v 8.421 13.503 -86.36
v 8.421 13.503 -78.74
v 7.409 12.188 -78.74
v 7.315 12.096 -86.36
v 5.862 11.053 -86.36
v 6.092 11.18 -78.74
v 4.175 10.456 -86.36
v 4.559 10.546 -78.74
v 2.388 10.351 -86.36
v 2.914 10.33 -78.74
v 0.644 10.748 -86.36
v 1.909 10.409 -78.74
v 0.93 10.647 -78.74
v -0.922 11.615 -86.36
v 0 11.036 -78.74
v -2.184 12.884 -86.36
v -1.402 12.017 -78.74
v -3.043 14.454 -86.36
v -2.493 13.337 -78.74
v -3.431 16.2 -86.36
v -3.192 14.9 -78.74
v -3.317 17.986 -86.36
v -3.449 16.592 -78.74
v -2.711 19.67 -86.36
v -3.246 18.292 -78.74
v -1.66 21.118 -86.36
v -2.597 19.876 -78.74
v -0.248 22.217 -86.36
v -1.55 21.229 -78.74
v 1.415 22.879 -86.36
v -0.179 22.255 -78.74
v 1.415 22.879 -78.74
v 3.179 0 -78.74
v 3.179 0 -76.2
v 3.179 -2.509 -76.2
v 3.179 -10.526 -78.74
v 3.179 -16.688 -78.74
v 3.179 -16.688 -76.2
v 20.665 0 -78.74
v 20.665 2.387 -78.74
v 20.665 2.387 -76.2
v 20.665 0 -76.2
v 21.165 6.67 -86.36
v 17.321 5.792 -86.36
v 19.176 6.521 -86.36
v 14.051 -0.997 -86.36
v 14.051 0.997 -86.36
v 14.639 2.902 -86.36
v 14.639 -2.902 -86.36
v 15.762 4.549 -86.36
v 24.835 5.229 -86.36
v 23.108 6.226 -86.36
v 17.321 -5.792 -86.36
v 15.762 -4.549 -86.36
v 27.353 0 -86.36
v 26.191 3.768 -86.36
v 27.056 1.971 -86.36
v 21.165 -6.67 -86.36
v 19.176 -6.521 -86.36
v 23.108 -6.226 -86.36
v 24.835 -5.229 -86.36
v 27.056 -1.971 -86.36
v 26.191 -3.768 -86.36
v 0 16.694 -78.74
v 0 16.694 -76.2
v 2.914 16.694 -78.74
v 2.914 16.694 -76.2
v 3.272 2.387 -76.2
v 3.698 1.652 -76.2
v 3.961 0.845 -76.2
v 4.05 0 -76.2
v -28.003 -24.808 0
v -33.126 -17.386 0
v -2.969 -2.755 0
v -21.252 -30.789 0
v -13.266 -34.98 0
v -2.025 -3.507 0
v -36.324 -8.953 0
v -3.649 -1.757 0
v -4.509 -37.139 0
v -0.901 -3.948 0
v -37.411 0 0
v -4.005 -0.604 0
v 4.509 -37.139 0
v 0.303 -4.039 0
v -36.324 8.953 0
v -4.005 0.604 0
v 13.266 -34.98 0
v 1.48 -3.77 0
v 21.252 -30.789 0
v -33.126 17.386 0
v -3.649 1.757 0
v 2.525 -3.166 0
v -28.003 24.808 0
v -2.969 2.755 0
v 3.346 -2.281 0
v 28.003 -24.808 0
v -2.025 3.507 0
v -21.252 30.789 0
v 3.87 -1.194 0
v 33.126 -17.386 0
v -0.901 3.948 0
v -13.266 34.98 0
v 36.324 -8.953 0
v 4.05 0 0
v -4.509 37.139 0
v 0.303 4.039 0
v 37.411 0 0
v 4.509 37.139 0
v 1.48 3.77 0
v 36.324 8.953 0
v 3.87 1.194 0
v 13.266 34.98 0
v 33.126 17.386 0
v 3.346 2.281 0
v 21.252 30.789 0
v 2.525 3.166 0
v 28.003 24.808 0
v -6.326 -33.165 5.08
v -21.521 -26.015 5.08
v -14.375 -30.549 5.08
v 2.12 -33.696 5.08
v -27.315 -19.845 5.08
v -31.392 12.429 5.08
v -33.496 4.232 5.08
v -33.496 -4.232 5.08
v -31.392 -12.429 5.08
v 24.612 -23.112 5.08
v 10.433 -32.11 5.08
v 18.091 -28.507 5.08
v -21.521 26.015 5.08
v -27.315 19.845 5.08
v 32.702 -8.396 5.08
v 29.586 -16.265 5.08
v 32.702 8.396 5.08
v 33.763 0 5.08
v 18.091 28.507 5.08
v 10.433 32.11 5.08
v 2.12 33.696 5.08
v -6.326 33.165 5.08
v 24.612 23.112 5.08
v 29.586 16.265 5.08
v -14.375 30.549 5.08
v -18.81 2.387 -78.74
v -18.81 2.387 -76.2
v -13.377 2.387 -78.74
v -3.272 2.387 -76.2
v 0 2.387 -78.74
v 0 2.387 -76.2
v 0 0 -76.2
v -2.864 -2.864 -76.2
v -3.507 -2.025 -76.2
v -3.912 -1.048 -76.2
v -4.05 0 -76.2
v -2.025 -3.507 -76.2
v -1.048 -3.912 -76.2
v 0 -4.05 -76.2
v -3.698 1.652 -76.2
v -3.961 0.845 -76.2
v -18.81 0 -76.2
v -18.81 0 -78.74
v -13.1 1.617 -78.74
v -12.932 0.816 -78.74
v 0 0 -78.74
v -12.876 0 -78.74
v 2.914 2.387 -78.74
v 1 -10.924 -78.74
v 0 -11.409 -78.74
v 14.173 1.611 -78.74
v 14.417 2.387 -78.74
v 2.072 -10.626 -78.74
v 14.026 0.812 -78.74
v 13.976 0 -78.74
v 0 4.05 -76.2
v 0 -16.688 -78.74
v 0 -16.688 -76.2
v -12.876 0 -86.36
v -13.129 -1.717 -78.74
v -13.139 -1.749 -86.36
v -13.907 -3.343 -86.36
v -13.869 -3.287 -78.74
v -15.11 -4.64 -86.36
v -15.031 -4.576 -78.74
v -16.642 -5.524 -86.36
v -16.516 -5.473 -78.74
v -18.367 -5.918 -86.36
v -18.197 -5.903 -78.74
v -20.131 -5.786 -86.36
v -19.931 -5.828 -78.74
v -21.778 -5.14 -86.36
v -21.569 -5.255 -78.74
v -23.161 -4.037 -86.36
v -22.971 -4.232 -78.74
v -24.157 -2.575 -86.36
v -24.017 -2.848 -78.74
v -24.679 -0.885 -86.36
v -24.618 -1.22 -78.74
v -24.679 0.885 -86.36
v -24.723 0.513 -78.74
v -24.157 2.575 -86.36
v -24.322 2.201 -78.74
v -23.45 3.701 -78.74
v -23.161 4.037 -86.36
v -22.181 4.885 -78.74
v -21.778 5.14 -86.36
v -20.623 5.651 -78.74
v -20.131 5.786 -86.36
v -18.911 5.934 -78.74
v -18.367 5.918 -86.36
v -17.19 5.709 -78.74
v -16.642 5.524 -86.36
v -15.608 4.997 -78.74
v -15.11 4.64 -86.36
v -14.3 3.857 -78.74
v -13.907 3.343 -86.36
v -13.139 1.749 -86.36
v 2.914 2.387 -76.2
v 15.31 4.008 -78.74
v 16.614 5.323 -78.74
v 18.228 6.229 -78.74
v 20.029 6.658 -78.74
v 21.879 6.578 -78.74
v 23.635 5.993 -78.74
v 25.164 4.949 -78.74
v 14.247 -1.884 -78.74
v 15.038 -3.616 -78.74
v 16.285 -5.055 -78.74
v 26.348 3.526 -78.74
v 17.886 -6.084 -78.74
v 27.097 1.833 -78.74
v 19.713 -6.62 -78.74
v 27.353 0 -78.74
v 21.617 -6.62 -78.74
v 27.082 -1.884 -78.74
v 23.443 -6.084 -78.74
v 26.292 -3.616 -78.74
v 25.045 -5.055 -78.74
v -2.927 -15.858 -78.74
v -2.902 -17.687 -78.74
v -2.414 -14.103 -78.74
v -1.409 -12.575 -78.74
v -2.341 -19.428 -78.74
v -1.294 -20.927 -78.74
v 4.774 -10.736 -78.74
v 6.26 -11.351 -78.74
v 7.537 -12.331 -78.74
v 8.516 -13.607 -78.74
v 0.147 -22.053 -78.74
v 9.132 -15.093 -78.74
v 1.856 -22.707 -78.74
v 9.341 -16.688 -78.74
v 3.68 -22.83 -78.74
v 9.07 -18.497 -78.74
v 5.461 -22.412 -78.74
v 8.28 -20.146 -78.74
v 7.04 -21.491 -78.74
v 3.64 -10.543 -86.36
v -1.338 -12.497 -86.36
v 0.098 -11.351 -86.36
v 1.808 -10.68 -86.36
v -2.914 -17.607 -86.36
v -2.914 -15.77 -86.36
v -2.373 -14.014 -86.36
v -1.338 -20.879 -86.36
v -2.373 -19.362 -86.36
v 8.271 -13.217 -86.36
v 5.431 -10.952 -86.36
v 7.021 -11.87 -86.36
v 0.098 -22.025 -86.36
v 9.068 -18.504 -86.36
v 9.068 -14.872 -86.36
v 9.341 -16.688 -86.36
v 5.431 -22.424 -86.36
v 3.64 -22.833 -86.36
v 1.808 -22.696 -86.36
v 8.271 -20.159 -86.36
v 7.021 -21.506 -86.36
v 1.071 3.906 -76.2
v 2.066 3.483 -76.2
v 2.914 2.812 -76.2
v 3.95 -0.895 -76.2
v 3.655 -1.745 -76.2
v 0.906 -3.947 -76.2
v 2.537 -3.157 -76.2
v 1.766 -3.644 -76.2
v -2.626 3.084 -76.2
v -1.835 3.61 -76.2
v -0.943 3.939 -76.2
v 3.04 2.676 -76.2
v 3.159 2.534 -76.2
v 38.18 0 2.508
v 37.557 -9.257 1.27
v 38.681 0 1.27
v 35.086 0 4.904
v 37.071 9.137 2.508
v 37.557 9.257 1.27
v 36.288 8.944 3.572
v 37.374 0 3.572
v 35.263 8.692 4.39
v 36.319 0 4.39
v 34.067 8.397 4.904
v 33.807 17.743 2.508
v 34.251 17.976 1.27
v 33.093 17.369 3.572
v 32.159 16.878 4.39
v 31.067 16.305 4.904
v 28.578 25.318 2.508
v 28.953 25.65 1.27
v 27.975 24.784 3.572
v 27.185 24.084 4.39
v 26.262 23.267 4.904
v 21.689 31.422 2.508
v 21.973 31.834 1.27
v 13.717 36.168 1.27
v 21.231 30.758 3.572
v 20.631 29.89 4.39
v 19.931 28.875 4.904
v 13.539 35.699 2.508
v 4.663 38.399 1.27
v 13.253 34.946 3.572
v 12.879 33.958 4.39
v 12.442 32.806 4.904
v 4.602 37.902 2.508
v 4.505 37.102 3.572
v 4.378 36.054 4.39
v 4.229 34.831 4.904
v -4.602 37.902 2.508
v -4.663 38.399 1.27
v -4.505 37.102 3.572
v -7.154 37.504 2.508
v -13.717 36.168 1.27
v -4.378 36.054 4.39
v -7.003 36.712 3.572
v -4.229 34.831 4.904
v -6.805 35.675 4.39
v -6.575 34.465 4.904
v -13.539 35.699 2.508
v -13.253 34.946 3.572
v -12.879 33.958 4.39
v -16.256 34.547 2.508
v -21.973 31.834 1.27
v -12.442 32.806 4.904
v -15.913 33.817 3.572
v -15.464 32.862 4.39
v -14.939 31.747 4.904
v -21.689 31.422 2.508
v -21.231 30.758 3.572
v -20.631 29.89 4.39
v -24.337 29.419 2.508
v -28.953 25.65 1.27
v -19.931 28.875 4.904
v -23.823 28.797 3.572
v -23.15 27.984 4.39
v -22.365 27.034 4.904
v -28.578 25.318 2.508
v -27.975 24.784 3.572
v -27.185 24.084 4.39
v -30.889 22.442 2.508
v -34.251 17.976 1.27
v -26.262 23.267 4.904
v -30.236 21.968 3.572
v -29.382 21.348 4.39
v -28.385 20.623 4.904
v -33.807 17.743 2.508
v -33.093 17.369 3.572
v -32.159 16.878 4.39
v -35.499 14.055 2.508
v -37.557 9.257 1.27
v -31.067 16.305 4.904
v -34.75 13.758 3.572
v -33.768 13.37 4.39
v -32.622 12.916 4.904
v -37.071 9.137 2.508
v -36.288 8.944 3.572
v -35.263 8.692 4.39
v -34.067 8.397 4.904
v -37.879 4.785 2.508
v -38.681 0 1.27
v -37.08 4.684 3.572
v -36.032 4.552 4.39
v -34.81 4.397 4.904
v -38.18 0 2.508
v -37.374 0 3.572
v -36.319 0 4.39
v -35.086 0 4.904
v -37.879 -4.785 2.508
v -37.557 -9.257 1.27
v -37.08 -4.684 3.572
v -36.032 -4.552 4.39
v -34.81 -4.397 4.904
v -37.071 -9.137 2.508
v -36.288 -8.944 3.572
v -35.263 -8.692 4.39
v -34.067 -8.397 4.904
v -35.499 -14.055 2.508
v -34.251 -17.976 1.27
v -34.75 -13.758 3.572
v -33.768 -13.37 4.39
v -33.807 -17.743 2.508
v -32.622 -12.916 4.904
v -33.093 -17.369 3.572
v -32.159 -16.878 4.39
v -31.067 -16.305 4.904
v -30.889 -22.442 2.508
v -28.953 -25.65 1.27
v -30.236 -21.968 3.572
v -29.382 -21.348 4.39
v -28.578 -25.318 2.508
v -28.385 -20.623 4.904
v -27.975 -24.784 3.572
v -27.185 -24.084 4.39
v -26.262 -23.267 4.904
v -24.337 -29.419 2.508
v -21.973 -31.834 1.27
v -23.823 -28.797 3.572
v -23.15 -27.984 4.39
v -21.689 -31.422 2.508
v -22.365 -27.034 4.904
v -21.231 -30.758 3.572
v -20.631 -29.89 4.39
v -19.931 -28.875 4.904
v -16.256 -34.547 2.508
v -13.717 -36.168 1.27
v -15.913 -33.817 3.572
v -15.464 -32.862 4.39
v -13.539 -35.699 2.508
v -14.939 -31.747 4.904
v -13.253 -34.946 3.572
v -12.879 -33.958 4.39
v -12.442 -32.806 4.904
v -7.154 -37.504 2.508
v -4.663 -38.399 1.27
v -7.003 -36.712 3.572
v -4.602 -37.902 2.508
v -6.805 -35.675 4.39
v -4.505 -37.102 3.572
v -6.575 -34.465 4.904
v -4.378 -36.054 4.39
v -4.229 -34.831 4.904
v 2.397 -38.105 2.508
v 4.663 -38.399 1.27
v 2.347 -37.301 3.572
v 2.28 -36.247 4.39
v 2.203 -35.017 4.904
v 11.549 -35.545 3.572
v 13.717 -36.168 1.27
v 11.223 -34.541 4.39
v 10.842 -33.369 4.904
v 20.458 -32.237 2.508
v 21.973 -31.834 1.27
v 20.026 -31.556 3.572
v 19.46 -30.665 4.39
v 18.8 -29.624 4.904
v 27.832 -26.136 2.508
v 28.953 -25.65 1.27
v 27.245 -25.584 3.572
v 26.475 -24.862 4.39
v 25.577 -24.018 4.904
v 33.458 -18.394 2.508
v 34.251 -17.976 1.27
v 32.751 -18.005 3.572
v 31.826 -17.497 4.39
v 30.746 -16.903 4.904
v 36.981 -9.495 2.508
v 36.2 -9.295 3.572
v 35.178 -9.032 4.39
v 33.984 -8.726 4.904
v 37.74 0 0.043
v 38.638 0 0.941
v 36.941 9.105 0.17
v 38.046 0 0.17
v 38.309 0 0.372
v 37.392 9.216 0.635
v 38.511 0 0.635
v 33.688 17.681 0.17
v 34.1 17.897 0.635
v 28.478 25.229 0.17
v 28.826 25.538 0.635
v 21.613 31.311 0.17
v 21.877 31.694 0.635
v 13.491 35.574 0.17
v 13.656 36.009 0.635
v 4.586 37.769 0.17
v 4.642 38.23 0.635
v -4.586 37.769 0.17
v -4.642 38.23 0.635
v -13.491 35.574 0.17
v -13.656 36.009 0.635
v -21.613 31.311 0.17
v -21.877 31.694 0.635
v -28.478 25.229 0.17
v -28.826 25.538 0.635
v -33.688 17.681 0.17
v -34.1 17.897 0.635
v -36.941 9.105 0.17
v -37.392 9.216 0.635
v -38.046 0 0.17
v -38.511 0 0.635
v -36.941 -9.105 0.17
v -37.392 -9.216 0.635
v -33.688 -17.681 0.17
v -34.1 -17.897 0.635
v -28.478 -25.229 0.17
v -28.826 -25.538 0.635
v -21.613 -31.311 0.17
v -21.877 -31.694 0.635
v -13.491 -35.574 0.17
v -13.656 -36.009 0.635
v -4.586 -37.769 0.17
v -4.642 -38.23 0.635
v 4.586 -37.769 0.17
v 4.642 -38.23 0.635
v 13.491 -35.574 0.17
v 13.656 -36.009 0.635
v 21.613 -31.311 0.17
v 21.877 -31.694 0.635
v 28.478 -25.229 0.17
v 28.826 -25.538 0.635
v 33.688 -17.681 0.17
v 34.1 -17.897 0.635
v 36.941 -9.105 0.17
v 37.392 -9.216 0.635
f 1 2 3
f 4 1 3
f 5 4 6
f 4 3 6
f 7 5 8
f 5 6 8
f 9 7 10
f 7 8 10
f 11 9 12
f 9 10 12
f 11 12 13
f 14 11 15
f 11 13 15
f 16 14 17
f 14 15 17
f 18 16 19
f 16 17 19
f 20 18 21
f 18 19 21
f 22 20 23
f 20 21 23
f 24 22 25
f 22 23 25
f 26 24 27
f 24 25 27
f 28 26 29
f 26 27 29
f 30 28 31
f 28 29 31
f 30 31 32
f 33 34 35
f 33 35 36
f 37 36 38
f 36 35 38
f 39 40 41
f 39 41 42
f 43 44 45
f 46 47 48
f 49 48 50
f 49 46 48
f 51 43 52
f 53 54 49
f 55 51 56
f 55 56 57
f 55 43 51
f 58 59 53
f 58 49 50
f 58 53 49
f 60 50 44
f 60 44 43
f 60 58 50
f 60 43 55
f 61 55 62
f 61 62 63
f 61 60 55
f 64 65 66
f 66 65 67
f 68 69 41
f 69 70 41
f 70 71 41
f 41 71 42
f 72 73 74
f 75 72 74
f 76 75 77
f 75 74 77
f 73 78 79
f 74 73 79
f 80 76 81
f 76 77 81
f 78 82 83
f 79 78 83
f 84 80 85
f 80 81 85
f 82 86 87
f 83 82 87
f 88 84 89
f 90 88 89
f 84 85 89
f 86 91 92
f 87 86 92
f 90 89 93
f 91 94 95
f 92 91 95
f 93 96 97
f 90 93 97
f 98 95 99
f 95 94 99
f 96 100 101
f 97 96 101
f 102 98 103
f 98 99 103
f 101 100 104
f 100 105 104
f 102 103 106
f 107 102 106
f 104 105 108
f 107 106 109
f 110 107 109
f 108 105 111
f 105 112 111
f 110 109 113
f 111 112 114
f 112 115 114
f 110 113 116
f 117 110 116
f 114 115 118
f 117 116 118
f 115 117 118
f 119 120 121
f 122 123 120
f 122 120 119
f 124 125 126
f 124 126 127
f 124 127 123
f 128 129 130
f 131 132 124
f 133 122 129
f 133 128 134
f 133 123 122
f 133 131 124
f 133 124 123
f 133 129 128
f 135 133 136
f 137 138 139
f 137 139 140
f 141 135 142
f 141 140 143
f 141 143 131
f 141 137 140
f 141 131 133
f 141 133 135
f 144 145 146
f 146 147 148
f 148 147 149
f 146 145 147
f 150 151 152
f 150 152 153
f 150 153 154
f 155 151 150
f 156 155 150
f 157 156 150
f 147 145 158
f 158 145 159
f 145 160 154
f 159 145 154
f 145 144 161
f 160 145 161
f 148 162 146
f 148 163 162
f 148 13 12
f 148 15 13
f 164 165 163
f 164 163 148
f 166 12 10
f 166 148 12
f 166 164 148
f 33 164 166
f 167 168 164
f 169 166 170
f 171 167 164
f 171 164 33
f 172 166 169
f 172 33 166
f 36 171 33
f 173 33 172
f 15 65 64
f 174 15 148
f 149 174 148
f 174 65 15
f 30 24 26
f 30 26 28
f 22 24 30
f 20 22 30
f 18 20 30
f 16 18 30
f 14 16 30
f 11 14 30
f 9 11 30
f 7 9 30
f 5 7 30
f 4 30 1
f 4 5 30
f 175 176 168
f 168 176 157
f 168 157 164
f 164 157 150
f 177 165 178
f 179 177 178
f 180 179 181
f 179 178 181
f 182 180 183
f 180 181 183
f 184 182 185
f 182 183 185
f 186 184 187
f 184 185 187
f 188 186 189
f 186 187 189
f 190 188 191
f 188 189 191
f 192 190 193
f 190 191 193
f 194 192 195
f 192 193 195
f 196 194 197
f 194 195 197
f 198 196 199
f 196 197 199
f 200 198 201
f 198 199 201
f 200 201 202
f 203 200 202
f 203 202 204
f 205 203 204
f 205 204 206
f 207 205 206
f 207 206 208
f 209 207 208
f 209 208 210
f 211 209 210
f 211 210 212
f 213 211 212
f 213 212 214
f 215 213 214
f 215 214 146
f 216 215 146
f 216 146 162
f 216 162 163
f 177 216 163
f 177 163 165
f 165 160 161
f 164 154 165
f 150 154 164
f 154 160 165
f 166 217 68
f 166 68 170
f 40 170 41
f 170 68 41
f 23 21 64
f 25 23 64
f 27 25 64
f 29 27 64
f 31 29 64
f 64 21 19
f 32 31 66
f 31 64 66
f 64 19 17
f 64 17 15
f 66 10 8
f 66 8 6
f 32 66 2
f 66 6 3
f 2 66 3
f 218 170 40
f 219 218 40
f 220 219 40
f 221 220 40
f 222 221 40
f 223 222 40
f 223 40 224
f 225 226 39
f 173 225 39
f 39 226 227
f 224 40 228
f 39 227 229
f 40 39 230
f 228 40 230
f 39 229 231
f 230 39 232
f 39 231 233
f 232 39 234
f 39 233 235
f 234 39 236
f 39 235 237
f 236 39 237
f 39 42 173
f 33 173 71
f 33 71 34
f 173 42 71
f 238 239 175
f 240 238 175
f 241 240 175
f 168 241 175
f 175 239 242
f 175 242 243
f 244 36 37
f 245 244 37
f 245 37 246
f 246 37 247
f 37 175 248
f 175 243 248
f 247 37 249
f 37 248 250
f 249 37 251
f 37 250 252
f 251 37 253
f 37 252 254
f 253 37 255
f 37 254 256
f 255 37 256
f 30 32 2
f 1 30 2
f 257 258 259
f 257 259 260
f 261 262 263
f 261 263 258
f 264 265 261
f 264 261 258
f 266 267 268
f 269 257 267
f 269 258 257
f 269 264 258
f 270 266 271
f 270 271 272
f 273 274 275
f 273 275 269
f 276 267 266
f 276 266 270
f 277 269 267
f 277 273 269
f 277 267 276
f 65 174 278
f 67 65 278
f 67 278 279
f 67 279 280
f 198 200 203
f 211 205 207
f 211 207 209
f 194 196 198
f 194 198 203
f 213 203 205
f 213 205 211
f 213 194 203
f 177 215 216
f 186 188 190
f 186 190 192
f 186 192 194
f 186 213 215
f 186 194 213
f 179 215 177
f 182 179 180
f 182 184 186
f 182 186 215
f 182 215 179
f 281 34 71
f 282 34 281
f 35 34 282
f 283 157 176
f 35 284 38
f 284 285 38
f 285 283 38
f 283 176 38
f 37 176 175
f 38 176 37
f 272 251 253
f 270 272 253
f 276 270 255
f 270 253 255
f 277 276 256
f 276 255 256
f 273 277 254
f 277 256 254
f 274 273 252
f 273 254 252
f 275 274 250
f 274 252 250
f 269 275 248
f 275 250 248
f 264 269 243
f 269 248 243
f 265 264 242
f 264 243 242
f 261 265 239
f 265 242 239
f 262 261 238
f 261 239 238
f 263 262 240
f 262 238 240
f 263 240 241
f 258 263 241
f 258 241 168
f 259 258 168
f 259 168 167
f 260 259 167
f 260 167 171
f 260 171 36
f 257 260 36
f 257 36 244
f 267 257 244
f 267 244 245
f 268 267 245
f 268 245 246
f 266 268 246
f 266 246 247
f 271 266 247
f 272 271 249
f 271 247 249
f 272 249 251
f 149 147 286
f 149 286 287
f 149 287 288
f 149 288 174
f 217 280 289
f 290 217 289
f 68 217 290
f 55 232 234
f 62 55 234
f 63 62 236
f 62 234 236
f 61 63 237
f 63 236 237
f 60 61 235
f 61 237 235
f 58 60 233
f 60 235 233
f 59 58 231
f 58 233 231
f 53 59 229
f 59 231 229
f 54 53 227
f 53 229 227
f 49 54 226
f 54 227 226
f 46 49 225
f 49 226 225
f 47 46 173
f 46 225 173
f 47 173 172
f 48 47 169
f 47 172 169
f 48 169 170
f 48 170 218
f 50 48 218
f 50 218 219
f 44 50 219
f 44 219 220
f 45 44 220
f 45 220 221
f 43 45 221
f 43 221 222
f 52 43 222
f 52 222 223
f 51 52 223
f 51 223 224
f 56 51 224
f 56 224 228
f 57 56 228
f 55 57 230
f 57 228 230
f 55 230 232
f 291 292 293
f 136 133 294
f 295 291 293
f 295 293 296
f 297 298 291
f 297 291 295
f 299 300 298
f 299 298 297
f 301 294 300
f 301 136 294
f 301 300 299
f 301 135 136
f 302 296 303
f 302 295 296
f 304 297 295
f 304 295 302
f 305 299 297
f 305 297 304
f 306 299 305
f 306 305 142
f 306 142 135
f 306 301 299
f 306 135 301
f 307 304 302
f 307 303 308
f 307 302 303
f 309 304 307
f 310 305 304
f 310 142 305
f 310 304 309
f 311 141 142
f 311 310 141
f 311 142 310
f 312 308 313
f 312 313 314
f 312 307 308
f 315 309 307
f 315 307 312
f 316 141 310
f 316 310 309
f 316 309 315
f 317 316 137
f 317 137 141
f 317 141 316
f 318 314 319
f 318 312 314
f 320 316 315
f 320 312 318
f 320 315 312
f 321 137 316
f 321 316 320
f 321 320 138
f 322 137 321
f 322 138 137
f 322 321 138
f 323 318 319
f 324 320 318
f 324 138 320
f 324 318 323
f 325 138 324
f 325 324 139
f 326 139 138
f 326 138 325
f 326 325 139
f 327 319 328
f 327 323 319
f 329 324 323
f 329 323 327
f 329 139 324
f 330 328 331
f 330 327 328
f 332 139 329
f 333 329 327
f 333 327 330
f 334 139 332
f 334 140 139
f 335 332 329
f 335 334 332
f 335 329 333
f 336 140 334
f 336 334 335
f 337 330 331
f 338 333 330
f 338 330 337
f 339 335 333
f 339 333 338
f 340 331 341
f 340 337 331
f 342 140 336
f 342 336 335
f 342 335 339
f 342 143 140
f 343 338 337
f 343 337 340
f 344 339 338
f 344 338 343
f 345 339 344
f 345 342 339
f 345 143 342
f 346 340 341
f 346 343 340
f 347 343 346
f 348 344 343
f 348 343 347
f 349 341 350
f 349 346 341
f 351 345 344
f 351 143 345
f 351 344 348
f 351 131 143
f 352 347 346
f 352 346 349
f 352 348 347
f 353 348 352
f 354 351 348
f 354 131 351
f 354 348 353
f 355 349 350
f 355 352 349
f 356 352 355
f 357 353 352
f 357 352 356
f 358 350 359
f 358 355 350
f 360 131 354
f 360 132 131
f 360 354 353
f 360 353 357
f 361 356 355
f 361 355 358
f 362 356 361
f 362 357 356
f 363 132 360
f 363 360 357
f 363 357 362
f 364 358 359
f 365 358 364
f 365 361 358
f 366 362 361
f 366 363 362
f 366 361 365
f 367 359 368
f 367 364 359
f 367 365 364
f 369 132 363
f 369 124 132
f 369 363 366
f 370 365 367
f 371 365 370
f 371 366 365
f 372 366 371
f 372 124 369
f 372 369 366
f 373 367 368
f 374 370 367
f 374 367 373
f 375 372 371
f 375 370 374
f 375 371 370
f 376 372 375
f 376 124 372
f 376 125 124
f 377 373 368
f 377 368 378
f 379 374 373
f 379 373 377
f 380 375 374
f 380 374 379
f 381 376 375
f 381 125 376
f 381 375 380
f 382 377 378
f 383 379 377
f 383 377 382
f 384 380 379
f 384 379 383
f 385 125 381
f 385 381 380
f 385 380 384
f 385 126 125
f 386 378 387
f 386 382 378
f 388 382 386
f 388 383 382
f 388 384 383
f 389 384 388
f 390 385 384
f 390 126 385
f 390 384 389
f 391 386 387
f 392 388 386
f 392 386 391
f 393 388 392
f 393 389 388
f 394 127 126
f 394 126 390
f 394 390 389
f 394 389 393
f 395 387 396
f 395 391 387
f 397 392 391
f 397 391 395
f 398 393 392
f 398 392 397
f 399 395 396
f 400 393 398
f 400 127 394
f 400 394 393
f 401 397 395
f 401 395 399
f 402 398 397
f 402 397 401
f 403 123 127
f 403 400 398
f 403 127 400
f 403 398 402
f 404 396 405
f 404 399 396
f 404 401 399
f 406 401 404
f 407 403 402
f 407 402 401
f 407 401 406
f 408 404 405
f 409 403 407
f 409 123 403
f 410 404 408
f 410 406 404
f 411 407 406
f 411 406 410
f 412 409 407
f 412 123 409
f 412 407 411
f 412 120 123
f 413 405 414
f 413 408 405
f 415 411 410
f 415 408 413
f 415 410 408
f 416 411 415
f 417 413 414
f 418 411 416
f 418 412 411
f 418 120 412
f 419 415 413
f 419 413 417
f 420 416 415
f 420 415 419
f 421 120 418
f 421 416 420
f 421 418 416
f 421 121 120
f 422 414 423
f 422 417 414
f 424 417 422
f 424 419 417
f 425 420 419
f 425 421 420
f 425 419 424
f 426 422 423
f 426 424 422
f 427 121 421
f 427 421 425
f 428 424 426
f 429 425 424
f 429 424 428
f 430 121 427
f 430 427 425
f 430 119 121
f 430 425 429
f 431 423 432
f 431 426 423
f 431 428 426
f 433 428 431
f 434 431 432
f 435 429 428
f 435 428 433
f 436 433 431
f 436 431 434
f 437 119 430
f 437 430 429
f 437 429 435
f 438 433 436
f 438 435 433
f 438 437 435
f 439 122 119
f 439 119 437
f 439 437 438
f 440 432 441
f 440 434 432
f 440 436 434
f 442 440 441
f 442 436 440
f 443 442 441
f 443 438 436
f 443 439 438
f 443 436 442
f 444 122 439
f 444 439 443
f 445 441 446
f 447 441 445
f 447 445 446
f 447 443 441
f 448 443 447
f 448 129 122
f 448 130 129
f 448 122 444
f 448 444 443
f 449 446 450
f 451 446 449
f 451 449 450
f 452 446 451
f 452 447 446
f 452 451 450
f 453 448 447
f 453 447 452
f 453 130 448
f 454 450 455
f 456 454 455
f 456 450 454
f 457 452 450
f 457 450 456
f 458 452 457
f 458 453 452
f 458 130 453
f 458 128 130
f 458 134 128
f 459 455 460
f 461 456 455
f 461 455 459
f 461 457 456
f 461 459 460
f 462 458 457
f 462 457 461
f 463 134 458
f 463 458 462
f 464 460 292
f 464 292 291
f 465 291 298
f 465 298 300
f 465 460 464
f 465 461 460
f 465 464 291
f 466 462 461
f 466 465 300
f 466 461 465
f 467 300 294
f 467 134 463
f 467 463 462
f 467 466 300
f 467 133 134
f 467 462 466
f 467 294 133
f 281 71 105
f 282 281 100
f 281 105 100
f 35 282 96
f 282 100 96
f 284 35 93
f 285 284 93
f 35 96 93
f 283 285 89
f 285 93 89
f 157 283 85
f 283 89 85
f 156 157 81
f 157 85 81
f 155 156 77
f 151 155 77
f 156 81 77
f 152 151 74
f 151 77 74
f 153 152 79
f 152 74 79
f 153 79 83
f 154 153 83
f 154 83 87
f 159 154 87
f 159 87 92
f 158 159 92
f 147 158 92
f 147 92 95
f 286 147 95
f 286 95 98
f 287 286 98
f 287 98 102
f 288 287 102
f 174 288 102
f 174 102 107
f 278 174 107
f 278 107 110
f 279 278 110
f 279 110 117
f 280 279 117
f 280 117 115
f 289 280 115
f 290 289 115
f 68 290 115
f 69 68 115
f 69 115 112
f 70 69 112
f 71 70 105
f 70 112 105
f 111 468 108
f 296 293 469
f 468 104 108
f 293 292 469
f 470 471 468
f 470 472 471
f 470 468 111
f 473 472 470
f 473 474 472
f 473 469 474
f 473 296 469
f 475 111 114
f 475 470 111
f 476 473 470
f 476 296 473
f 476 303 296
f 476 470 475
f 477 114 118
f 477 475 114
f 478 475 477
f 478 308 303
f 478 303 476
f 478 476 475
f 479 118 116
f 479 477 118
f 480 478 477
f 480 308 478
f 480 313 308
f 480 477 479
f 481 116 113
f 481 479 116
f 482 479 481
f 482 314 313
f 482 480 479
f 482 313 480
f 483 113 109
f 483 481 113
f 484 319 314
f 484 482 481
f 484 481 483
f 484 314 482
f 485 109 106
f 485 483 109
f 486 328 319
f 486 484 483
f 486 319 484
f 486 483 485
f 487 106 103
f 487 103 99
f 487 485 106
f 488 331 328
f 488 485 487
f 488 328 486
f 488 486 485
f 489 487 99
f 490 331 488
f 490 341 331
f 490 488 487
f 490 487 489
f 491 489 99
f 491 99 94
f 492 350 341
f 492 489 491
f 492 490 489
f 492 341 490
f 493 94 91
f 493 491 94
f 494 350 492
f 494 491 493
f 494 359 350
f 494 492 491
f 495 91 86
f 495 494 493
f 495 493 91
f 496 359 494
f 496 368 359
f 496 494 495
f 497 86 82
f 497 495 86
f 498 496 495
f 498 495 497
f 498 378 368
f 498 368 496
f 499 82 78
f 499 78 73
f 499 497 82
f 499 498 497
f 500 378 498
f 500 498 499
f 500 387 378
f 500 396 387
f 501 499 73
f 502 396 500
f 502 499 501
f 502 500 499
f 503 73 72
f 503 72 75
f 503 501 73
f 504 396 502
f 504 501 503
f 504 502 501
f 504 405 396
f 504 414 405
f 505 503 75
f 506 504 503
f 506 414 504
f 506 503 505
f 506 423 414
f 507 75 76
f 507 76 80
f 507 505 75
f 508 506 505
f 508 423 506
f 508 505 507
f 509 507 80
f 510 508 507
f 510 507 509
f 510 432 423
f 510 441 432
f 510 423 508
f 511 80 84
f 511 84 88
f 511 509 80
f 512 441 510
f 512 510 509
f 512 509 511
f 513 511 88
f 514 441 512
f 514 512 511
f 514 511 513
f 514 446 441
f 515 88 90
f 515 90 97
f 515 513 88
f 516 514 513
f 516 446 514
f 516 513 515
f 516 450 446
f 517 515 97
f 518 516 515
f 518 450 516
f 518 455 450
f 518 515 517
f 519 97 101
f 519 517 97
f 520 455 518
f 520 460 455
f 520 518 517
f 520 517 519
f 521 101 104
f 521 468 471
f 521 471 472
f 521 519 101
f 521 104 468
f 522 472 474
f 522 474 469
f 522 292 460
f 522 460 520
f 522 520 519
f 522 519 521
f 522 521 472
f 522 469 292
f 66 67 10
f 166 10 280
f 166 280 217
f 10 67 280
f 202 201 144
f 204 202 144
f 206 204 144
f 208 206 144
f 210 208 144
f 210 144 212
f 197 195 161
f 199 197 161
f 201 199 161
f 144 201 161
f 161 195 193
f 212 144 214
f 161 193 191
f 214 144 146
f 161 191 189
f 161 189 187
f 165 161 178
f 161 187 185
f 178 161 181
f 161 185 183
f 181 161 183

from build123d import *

# Parameters (mm, degrees)
F0_R      = 38.6812763638
F1_DEPTH  = 5.08
F2_R      = 4.0500019282
F3_DEPTH  = 76.2
F4_W      = 3.1792044174
F4_H      = 16.6880693287
F4_W_2    = 18.8102982938
F4_H_2    = 2.3871629965
F4_W_3    = 2.9142722487
F4_H_3    = 14.3064234871
F5_DEPTH  = 2.54
F6_R      = 1.27
F8_R      = 6.6885556935
F8_R_2    = 5.9347433367
F8_R_3    = 6.3640715152
F8_R_4    = 6.1622808629
F9_DEPTH  = 7.62
F11_DEPTH = 7.621


# Not quite as in the source:
# - a fillet or chamfer that OpenCascade refuses, or shapes differently, is made with other operations: its cross-section is extruded or revolved along the edge and cut away or added


with BuildPart() as f1:
    # F0 (on Top) → F1 (new body)
    with BuildSketch(Plane.XY):
        Circle(F0_R)
    extrude(amount=F1_DEPTH)

    # F2 (on face) → F3 (join)
    with BuildSketch(Plane(origin=(0, 0, 0), x_dir=(1, 0, 0), z_dir=(0, 0, -1))):
        Circle(F2_R)
    extrude(amount=F3_DEPTH)

    # F4 (on face) → F5 (join)
    with BuildSketch(Plane(origin=(0, 0, -76.2), x_dir=(1, 0, 0), z_dir=(0, 0, -1))):
        with Locations((1.5896022087, 8.3440346643)):
            Rectangle(F4_W, F4_H)
        Polygon((3.1792044174, 0), (0, 0), (0, -2.3871629965), (2.9142722487, -2.3871629965), (20.6648353487, -2.3871629965), (20.6648353487, 0), align=None)
        with Locations((-9.4051491469, -1.1935814982)):
            Rectangle(F4_W_2, F4_H_2)
        with Locations((1.4571361244, -9.54037474)):
            Rectangle(F4_W_3, F4_H_3)
    extrude(amount=F5_DEPTH)

    # F6
    f6_edges = [f1.edges().sort_by_distance(p)[0] for p in [
        (-38.681276, 0, 0),
    ]]
    fillet(f6_edges, radius=F6_R)

    # F7: fillet of radius 5.08 on 1 edges, made by hand

    # F7_s1 → F7_t2 (revolve, cut)
    with BuildSketch(Plane.XZ):
        with BuildLine():
            ThreePointArc((38.6812763638, 1.27), (36.8734394874, 4.0160926284), (33.7625875141, 5.08))
            Line((33.7625875141, 5.08), (33.7625875141, 5.1816))
            Line((33.7625875141, 5.1816), (38.6812763638, 5.1816))
            Line((38.6812763638, 5.1816), (38.7828763638, 5.08))
            ThreePointArc((38.7828763638, 5.08), (38.7828763638, 3.175), (38.7796501408, 1.2954))
            Line((38.7796501408, 1.2954), (38.6812763638, 1.27))
        make_face()
    revolve(axis=Axis((0, 0, 5.08), (0, 0, 1)), mode=Mode.SUBTRACT)

    # F8 (on face) → F9 (join)
    with BuildSketch(Plane(origin=(0, 0, -78.74), x_dir=(1, 0, 0), z_dir=(0, 0, -1))):
        with Locations((20.6648353487, 0)):
            Circle(F8_R)
        with Locations((-18.8102982938, 0)):
            Circle(F8_R_2)
        with Locations((2.9142722487, -16.6935864836)):
            Circle(F8_R_3)
        with Locations((3.1792044174, 16.6880693287)):
            Circle(F8_R_4)
    extrude(amount=F9_DEPTH)

    # F10 (on face) → F11 (cut, through all)
    with BuildSketch(Plane.XY.offset(-78.74)):
        Polygon((1.4149318504, 22.8785185463), (8.4209625868, 13.5033250881), (25.2221585853, 26.6414508232), (18.2112082839, 35.6629639864), (10.4142271803, 29.6036426698), align=None)
    extrude(amount=-F11_DEPTH, mode=Mode.SUBTRACT)


solid = f1.part
